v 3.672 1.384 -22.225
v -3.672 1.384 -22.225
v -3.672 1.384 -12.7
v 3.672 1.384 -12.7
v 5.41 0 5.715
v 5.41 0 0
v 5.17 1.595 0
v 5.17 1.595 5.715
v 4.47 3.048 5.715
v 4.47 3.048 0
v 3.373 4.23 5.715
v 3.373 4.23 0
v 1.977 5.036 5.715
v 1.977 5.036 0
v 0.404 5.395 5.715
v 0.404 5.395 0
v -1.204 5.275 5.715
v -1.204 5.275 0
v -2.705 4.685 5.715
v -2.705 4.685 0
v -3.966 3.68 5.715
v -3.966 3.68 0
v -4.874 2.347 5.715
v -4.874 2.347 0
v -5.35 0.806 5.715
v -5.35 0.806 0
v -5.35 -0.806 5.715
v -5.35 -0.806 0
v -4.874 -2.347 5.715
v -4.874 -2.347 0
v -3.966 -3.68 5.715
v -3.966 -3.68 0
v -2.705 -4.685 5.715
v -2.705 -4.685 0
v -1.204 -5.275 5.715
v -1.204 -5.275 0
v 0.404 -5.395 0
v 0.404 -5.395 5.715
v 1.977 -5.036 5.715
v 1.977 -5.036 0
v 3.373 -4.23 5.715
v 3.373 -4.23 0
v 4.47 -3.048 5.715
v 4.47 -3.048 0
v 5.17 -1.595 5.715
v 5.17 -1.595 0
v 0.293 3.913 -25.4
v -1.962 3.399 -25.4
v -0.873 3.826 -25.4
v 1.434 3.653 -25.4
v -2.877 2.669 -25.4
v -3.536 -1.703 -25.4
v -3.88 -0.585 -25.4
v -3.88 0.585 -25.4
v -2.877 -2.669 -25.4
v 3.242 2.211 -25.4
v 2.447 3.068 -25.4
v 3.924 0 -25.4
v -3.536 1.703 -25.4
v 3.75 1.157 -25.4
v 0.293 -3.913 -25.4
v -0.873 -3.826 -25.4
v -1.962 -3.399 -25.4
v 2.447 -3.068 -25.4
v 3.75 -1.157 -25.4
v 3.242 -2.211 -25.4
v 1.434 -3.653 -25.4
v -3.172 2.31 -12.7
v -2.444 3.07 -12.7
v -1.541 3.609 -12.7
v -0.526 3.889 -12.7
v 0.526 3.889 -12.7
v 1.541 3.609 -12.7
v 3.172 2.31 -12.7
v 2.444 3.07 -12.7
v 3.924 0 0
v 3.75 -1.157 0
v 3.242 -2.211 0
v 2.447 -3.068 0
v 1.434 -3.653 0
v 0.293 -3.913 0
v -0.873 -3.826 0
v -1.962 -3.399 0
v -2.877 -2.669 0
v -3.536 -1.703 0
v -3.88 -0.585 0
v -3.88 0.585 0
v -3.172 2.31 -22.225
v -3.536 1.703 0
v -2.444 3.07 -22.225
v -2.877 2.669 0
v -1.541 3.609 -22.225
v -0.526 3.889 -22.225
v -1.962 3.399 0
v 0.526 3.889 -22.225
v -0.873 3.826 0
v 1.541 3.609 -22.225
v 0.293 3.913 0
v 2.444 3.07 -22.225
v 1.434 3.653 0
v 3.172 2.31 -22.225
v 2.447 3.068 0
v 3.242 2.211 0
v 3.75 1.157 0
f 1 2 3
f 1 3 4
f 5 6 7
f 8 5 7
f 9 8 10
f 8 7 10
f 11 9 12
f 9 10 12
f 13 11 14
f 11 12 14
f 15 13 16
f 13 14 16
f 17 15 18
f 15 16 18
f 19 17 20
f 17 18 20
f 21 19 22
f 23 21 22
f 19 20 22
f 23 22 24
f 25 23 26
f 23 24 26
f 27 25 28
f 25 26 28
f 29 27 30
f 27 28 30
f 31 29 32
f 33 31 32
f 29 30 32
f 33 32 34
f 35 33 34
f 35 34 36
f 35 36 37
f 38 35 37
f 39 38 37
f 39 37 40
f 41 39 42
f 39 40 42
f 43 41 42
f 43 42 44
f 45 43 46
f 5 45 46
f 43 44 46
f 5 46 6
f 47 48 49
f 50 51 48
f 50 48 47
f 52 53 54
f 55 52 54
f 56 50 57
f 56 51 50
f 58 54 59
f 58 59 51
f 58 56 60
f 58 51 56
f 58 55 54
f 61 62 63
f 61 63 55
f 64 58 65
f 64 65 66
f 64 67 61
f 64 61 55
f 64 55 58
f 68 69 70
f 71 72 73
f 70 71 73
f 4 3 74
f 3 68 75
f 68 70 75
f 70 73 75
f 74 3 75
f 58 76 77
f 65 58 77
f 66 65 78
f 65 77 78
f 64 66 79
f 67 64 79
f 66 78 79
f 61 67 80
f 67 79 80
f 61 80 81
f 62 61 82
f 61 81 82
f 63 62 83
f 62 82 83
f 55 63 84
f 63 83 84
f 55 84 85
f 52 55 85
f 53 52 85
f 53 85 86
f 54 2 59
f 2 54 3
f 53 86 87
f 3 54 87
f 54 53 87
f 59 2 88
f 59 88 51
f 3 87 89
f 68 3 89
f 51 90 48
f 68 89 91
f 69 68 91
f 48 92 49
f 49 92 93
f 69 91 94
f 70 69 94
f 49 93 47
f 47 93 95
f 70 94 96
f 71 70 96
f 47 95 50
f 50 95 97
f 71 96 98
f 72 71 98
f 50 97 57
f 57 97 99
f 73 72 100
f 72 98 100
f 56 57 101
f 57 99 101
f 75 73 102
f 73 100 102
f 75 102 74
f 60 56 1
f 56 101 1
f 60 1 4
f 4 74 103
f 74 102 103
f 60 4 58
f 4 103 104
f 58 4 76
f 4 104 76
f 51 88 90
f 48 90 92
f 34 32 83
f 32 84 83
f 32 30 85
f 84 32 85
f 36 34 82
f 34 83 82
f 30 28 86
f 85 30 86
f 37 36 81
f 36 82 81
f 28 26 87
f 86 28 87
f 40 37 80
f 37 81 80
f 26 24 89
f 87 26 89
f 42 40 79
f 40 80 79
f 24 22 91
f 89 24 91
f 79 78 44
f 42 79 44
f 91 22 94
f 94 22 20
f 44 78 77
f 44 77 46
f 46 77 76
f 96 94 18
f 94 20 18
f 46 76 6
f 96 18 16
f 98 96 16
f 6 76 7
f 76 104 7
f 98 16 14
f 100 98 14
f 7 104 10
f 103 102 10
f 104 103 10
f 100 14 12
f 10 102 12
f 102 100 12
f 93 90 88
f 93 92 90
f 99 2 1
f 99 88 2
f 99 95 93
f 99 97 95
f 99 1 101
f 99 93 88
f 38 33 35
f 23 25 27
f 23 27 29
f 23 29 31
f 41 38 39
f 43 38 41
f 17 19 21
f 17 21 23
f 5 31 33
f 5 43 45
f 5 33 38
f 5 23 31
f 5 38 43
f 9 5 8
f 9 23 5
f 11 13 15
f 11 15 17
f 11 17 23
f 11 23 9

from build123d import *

# Parameters (mm, degrees)
SKETCH1_R           = 5.4102
BOSS_EXTRUDE1_DEPTH = 5.715
SKETCH2_R           = 3.9243
BOSS_EXTRUDE2_DEPTH = 25.4
SKETCH3_W           = 9.007282867
SKETCH3_H           = 9.525
CUT_EXTRUDE1_DEPTH  = 2.54


with BuildPart() as part:
    # Sketch1 → Boss-Extrude1 (new body)
    with BuildSketch(Plane.XY):
        Circle(SKETCH1_R)
    extrude(amount=BOSS_EXTRUDE1_DEPTH)

    # Sketch2 → Boss-Extrude2 (add)
    with BuildSketch(Plane(origin=(0, 0, 0), x_dir=(-1, 0, 0), z_dir=(0, 0, -1))):
        with Locations(Location((0, 0, 0), (0, 0, 180))):
            Circle(SKETCH2_R)
    extrude(amount=BOSS_EXTRUDE2_DEPTH)

    # Sketch3 → Cut-Extrude1 (cut)
    with BuildSketch(Plane(origin=(0, 3.9243, 0), x_dir=(1, 0, 0), z_dir=(0, 1, 0))):
        with Locations((-0.278552297, 17.4625)):
            Rectangle(SKETCH3_W, SKETCH3_H)
    extrude(amount=-CUT_EXTRUDE1_DEPTH, mode=Mode.SUBTRACT)


solid = part.part
